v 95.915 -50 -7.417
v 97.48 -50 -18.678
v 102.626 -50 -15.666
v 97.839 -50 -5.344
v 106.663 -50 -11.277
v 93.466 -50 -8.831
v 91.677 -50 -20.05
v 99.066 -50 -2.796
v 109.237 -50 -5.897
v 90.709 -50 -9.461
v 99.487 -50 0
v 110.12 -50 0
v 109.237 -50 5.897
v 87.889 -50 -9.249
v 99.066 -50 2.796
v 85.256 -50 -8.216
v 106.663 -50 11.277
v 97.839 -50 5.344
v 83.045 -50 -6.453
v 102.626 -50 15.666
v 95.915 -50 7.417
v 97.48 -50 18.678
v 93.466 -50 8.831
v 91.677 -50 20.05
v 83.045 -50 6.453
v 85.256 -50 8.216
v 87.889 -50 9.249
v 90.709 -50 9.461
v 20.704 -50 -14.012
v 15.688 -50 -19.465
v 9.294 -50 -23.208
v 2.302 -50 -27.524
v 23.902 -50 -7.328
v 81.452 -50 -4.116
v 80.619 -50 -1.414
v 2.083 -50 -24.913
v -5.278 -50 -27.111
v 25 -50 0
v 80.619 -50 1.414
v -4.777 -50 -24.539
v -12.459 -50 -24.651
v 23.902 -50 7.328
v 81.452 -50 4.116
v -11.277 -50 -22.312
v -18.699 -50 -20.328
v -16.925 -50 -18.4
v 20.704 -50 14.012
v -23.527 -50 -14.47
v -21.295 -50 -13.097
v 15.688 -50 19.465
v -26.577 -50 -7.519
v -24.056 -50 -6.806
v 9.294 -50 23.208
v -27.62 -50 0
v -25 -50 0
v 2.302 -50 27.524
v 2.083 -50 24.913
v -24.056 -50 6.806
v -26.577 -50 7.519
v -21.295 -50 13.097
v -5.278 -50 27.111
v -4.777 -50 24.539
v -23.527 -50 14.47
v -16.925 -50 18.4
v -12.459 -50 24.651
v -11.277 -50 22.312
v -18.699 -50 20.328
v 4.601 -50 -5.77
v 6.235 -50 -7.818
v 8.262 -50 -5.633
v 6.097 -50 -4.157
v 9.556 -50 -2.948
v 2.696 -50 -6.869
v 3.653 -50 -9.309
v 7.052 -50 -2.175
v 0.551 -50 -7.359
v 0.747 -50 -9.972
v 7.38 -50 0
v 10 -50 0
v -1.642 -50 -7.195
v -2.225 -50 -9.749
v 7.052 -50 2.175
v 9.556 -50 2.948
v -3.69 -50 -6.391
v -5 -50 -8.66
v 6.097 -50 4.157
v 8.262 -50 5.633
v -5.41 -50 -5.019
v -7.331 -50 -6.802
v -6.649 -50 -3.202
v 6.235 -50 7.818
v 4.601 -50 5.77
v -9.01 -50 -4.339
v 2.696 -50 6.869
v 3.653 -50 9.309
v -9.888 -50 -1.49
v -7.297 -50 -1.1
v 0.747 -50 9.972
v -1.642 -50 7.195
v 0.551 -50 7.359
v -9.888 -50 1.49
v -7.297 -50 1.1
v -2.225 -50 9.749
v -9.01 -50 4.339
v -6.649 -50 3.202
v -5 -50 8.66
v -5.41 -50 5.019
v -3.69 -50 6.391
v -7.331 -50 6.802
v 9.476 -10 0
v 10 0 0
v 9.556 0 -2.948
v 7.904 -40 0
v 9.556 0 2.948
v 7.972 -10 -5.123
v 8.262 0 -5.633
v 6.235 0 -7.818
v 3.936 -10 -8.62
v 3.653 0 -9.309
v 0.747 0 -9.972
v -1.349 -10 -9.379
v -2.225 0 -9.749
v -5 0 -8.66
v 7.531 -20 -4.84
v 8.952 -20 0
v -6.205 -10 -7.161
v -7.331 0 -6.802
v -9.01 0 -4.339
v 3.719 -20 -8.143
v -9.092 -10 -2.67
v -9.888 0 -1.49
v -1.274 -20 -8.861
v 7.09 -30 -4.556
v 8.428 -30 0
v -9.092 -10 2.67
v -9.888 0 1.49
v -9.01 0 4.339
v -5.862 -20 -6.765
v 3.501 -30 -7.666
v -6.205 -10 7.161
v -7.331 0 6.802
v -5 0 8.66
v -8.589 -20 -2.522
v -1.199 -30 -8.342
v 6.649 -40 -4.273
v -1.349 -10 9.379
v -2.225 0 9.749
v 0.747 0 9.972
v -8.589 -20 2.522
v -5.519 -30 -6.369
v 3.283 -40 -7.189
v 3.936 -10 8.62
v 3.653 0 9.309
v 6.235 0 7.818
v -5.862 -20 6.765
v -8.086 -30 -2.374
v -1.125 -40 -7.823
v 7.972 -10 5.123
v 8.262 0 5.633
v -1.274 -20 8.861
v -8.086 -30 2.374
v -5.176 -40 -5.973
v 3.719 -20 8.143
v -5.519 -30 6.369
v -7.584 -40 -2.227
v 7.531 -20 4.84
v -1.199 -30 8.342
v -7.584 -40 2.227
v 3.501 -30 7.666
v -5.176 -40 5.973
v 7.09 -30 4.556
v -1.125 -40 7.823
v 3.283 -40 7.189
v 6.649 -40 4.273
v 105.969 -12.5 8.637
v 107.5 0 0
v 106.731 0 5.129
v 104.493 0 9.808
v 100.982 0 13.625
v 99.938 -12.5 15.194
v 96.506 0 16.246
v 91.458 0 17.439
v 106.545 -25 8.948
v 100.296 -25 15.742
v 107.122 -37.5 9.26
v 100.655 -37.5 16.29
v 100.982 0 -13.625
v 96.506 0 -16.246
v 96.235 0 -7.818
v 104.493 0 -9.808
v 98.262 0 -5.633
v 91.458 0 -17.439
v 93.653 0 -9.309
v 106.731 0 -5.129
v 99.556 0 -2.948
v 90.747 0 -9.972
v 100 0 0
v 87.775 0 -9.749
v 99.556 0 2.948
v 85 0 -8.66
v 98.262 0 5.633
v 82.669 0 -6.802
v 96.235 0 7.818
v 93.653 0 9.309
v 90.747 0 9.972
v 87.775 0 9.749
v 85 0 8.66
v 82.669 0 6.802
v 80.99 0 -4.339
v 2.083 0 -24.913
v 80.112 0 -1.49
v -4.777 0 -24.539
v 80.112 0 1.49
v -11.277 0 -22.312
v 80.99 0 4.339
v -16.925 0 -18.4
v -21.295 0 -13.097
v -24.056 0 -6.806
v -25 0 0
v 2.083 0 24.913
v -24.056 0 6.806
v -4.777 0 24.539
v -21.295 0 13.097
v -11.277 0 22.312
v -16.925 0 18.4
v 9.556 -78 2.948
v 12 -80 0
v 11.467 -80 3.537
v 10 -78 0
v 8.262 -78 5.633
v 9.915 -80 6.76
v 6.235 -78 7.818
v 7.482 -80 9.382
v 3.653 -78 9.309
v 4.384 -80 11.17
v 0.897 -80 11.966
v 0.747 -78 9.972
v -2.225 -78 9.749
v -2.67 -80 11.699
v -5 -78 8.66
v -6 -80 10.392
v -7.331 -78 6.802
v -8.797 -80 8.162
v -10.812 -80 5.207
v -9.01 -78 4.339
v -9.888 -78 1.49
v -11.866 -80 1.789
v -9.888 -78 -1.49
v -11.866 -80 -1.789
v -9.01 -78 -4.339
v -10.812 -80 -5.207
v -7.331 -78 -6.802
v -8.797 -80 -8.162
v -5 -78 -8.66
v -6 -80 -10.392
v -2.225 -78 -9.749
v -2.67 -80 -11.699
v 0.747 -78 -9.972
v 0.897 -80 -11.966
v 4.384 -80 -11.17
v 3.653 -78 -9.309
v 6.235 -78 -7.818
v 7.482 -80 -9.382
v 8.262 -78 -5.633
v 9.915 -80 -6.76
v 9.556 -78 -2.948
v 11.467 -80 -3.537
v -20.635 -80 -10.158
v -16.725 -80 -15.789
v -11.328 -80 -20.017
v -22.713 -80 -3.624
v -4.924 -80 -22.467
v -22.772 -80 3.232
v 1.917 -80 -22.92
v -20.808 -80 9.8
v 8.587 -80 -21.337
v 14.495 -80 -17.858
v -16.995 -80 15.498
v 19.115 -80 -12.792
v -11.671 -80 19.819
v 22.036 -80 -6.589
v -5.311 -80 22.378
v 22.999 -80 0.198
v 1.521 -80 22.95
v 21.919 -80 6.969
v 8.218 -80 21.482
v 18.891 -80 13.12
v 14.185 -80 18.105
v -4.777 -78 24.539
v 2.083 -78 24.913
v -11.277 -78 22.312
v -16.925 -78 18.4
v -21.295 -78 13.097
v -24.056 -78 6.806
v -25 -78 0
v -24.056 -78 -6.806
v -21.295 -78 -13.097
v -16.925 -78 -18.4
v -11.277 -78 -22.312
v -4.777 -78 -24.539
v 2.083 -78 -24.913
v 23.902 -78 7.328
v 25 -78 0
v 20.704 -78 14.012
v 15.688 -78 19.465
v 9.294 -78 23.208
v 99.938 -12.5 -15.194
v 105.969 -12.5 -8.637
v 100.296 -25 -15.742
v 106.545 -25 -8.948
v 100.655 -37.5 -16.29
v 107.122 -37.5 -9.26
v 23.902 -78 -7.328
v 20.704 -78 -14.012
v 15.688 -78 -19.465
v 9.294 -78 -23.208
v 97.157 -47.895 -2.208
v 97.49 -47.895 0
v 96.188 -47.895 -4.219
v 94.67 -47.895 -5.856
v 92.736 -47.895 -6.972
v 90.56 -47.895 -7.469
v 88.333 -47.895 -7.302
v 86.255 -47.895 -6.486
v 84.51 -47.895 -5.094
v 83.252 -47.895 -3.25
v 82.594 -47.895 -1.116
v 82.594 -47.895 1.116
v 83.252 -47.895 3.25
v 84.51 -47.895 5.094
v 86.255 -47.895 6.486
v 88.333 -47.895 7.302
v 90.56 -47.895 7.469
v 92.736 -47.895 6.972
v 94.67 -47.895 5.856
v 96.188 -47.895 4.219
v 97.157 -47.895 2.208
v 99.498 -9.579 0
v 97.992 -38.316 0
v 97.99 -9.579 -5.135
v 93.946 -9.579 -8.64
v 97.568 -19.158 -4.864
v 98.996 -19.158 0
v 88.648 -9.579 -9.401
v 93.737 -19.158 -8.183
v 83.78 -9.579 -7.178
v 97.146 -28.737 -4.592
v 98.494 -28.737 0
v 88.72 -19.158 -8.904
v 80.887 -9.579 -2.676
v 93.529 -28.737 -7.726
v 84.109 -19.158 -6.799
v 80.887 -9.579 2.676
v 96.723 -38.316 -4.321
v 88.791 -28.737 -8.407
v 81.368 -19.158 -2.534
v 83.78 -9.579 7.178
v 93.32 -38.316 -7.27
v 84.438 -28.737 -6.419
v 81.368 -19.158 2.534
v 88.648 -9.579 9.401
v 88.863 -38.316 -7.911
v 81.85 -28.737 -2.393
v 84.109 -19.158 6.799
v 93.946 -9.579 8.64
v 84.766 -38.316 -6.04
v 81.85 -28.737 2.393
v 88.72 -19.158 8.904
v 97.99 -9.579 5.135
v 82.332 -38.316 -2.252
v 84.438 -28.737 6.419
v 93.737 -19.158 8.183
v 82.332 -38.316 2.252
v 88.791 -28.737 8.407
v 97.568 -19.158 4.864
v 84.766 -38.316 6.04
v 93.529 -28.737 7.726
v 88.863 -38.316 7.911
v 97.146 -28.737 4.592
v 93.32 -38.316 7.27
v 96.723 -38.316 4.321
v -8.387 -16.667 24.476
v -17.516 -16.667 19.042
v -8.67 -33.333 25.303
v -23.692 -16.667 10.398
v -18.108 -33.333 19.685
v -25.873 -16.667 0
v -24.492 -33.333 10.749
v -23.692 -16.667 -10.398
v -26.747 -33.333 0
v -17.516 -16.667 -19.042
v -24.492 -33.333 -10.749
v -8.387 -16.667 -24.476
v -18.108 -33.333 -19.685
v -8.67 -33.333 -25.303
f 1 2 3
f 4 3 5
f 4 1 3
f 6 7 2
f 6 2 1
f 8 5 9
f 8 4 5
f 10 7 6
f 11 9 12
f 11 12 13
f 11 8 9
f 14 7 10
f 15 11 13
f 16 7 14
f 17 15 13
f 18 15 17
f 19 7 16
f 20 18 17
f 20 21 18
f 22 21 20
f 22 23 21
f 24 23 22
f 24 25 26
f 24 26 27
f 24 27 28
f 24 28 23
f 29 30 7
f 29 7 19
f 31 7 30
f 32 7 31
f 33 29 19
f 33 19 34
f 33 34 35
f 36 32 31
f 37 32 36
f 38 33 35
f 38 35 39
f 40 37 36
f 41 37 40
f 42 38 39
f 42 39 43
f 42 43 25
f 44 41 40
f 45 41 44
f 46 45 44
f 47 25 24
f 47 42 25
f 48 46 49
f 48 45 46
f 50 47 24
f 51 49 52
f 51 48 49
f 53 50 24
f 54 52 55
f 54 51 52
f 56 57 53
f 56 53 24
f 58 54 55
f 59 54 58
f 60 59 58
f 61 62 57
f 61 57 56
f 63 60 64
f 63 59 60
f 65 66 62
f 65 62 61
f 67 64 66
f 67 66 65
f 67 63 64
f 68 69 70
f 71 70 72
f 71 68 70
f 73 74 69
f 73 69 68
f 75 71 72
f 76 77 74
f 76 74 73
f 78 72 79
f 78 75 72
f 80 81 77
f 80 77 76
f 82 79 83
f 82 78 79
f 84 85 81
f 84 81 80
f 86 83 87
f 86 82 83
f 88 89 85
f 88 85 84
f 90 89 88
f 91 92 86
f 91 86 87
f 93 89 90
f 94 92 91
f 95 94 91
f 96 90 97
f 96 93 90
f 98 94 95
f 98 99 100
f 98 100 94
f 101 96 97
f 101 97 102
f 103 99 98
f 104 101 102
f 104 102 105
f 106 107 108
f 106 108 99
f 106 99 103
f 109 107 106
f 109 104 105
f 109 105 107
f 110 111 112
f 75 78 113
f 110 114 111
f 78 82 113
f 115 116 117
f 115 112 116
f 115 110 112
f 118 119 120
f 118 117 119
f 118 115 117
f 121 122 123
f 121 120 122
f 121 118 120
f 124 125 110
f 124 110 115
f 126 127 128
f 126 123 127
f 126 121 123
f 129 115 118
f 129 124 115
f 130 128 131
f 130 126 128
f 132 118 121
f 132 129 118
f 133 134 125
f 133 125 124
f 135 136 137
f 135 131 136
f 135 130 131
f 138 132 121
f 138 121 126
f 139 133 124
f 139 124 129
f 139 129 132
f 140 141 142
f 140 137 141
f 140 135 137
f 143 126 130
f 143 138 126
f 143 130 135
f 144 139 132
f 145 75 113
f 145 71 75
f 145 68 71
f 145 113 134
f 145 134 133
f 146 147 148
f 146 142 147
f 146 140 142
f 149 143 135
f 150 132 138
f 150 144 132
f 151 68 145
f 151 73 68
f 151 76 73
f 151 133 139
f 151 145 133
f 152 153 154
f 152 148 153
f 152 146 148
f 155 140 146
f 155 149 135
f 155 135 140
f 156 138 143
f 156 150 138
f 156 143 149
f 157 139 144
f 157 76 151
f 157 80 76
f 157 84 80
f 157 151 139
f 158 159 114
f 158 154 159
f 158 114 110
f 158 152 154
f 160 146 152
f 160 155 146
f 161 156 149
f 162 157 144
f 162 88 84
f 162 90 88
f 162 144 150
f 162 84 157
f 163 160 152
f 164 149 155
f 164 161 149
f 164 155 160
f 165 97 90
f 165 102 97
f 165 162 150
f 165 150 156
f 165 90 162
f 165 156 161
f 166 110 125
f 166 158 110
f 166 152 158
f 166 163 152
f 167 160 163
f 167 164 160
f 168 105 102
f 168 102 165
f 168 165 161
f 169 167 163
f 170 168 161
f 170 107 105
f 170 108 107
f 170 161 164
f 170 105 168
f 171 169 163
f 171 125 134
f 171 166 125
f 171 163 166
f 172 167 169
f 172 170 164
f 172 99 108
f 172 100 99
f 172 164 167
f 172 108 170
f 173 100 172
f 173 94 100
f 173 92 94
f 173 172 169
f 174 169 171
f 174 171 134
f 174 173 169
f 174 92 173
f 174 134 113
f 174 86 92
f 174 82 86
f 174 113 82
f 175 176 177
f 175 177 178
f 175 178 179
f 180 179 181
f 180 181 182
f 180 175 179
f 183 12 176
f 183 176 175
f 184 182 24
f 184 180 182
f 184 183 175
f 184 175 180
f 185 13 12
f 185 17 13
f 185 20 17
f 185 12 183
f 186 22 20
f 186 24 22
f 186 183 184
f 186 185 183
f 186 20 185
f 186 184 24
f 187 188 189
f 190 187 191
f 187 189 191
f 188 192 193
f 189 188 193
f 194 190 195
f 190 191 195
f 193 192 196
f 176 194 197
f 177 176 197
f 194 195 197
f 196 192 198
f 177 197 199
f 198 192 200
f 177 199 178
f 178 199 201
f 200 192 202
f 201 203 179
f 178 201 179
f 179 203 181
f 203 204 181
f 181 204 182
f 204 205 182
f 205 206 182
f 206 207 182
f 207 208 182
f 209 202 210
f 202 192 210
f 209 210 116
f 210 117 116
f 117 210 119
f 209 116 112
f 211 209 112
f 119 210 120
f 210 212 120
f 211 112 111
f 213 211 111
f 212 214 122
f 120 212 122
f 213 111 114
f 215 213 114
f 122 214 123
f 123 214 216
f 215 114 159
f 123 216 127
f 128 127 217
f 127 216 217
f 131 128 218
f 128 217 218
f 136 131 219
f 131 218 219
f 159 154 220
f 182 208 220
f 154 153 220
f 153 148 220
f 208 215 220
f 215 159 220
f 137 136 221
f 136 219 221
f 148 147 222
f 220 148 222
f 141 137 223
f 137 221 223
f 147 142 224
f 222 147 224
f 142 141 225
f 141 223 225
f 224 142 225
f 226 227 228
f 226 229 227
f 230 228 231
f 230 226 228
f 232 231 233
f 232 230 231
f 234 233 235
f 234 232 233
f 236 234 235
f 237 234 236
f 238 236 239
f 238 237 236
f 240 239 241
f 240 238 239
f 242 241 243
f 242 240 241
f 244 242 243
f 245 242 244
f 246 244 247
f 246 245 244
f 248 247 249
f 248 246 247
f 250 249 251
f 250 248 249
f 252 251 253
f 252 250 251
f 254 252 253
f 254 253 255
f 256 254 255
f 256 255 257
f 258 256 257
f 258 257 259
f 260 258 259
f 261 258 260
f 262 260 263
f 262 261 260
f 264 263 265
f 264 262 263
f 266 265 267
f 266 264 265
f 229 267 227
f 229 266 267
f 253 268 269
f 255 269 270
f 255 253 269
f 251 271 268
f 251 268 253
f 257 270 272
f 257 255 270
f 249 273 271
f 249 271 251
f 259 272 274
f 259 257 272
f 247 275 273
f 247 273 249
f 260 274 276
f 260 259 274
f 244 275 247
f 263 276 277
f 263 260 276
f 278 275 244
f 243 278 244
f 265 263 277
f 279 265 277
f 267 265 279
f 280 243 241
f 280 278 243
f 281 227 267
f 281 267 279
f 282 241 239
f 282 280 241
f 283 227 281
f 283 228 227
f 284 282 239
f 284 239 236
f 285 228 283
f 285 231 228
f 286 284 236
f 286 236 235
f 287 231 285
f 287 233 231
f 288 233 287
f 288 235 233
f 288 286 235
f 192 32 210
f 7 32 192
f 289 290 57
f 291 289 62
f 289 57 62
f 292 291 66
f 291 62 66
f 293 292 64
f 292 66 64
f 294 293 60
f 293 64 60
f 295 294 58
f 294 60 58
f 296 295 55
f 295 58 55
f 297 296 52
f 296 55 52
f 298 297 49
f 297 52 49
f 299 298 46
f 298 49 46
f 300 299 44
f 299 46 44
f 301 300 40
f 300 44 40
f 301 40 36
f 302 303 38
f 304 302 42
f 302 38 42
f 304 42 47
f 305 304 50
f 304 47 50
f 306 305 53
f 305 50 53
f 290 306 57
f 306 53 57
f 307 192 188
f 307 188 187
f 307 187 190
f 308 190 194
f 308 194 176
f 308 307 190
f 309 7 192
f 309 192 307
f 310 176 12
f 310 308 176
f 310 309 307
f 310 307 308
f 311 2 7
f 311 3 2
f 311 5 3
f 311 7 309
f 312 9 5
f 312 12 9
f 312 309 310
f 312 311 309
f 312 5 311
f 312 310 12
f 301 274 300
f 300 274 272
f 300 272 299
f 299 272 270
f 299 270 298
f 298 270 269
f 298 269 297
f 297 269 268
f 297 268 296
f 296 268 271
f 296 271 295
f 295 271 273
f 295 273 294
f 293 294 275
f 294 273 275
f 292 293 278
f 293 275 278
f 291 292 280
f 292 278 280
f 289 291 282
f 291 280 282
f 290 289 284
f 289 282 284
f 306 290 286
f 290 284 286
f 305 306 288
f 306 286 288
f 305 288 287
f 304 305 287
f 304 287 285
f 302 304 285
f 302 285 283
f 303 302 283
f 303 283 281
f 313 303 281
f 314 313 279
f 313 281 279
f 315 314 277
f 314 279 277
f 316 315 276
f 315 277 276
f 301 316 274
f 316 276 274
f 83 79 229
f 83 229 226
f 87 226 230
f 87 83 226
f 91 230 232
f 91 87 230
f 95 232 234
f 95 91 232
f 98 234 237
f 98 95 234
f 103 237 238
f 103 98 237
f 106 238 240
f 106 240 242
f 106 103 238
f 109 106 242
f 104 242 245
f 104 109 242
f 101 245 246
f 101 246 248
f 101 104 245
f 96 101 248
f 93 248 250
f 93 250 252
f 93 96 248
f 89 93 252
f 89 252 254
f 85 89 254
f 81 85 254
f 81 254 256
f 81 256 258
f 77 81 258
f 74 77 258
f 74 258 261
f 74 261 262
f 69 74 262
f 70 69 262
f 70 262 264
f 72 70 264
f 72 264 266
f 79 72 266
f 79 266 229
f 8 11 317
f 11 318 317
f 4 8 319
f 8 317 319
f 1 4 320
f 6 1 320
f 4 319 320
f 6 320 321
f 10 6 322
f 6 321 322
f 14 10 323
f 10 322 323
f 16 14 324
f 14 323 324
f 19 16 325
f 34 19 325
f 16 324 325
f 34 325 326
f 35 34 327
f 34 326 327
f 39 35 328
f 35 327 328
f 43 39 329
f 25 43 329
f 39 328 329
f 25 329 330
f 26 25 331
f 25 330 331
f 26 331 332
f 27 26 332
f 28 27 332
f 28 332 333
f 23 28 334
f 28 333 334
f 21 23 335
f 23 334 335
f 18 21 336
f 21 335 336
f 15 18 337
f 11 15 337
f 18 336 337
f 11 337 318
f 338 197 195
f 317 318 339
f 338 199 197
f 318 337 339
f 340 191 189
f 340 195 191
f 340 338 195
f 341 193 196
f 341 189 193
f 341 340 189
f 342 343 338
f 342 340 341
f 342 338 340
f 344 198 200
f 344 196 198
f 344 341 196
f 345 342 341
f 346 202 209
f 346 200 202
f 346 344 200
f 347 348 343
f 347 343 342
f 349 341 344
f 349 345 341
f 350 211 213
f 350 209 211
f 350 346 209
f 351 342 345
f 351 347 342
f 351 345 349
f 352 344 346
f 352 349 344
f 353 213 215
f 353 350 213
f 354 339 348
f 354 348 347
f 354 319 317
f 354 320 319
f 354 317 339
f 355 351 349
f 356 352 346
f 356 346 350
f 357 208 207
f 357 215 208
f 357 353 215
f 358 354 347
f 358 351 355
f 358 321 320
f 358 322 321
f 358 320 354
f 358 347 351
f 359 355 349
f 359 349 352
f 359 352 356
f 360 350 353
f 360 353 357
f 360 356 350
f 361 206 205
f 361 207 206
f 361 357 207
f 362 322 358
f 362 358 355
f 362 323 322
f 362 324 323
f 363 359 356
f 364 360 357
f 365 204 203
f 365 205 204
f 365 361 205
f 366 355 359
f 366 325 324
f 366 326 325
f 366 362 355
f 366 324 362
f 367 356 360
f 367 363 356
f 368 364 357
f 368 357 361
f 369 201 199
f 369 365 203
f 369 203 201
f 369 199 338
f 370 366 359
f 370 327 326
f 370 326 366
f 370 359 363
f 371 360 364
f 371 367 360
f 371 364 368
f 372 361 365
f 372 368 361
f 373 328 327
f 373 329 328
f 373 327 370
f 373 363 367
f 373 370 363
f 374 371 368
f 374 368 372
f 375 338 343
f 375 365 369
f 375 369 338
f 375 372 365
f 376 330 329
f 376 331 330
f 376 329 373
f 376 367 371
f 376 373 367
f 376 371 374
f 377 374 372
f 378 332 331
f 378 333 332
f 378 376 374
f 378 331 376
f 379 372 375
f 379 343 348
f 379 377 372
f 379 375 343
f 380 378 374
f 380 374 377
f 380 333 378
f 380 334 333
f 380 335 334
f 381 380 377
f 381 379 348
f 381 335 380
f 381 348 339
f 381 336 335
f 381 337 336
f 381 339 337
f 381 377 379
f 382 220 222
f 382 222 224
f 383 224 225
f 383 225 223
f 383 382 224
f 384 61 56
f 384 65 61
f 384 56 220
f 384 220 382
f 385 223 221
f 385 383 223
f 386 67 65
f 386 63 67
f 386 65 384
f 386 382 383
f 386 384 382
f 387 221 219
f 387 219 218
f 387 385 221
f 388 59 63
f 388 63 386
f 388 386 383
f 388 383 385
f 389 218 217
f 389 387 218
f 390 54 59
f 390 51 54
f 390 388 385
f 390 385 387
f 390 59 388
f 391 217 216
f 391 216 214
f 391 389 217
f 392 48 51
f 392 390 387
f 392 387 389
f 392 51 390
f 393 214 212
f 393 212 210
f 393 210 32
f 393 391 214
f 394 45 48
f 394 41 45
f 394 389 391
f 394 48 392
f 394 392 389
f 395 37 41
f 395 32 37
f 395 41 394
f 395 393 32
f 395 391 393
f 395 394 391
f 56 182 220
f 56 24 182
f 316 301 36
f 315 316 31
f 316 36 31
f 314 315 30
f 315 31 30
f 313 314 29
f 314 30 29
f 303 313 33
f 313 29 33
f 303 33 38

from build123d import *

# Parameters (mm, degrees)
F0_R     = 10
F1_DEPTH = 50
F1_TAPER = -3
F2_DEPTH = 80


# Not quite as in the source:
# - a fillet or chamfer that OpenCascade refuses, or shapes differently, is made with other operations: its cross-section is extruded or revolved along the edge and cut away or added


with BuildPart() as f1:
    # F0 (on Front) → F1 (new body)
    with BuildSketch(Plane.XZ):
        with BuildLine():
            ThreePointArc((2.0833333333, -24.9130432148), (18.3995018048, -16.9250800097), (25, 0))
            ThreePointArc((25, 0), (18.3995018048, 16.9250800097), (2.0833333333, 24.9130432148))
            ThreePointArc((2.0833333333, 24.9130432148), (-25, 0), (2.0833333333, -24.9130432148))
        make_face()
        Circle(F0_R, mode=Mode.SUBTRACT)
        with BuildLine():
            ThreePointArc((2.0833333333, 24.9130432148), (18.3995018048, 16.9250800097), (25, 0))
            ThreePointArc((25, 0), (18.3995018048, -16.9250800097), (2.0833333333, -24.9130432148))
            Line((2.0833333333, -24.9130432148), (91.4583333333, -17.4391302504))
            ThreePointArc((91.4583333333, -17.4391302504), (72.5, 0), (91.4583333333, 17.4391302504))
            Line((91.4583333333, 17.4391302504), (2.0833333333, 24.9130432148))
        make_face()
        with BuildLine():
            ThreePointArc((107.5, 0), (102.8796512634, 11.8475560068), (91.4583333333, 17.4391302504))
            ThreePointArc((91.4583333333, 17.4391302504), (72.5, 0), (91.4583333333, -17.4391302504))
            ThreePointArc((91.4583333333, -17.4391302504), (102.8796512634, -11.8475560068), (107.5, 0))
        make_face()
        with Locations((90, 0)):
            Circle(F0_R, mode=Mode.SUBTRACT)
    extrude(amount=F1_DEPTH, taper=F1_TAPER)

    # F0 (on Front) → F2 (join)
    with BuildSketch(Plane.XZ):
        with BuildLine():
            ThreePointArc((2.0833333333, -24.9130432148), (18.3995018048, -16.9250800097), (25, 0))
            ThreePointArc((25, 0), (18.3995018048, 16.9250800097), (2.0833333333, 24.9130432148))
            ThreePointArc((2.0833333333, 24.9130432148), (-25, 0), (2.0833333333, -24.9130432148))
        make_face()
        Circle(F0_R, mode=Mode.SUBTRACT)
    extrude(amount=F2_DEPTH)

    # F3: chamfer of 2 on 3 edges, made by hand

    # F3_s1 → F3_t2 (revolve, cut)
    with BuildSketch(Plane(origin=(0, 0, 0), x_dir=(0, 1, 0), z_dir=(0.9965217286, 0, 0.0833333333))):
        Polygon((-78, -25), (-80, -23), (-80, -25), align=None)
    revolve(axis=Axis((0, -80, 0), (0, 1, 0)), mode=Mode.SUBTRACT)

    # F3_s3 → F3_t4 (revolve, cut)
    with BuildSketch(Plane.XY):
        Polygon((12, -80), (10, -78), (10, -80), align=None)
    revolve(axis=Axis((0, -80, 0), (0, -1, 0)), mode=Mode.SUBTRACT)

    # F3_s5 → F3_t6 (revolve, cut)
    with BuildSketch(Plane.XY):
        Polygon((99.4871712864, -50), (97.4899122169, -47.8953280875), (97.3796110358, -50), align=None)
    revolve(axis=Axis((90, -50, 0), (0, 1, 0)), mode=Mode.SUBTRACT)


solid = f1.part
